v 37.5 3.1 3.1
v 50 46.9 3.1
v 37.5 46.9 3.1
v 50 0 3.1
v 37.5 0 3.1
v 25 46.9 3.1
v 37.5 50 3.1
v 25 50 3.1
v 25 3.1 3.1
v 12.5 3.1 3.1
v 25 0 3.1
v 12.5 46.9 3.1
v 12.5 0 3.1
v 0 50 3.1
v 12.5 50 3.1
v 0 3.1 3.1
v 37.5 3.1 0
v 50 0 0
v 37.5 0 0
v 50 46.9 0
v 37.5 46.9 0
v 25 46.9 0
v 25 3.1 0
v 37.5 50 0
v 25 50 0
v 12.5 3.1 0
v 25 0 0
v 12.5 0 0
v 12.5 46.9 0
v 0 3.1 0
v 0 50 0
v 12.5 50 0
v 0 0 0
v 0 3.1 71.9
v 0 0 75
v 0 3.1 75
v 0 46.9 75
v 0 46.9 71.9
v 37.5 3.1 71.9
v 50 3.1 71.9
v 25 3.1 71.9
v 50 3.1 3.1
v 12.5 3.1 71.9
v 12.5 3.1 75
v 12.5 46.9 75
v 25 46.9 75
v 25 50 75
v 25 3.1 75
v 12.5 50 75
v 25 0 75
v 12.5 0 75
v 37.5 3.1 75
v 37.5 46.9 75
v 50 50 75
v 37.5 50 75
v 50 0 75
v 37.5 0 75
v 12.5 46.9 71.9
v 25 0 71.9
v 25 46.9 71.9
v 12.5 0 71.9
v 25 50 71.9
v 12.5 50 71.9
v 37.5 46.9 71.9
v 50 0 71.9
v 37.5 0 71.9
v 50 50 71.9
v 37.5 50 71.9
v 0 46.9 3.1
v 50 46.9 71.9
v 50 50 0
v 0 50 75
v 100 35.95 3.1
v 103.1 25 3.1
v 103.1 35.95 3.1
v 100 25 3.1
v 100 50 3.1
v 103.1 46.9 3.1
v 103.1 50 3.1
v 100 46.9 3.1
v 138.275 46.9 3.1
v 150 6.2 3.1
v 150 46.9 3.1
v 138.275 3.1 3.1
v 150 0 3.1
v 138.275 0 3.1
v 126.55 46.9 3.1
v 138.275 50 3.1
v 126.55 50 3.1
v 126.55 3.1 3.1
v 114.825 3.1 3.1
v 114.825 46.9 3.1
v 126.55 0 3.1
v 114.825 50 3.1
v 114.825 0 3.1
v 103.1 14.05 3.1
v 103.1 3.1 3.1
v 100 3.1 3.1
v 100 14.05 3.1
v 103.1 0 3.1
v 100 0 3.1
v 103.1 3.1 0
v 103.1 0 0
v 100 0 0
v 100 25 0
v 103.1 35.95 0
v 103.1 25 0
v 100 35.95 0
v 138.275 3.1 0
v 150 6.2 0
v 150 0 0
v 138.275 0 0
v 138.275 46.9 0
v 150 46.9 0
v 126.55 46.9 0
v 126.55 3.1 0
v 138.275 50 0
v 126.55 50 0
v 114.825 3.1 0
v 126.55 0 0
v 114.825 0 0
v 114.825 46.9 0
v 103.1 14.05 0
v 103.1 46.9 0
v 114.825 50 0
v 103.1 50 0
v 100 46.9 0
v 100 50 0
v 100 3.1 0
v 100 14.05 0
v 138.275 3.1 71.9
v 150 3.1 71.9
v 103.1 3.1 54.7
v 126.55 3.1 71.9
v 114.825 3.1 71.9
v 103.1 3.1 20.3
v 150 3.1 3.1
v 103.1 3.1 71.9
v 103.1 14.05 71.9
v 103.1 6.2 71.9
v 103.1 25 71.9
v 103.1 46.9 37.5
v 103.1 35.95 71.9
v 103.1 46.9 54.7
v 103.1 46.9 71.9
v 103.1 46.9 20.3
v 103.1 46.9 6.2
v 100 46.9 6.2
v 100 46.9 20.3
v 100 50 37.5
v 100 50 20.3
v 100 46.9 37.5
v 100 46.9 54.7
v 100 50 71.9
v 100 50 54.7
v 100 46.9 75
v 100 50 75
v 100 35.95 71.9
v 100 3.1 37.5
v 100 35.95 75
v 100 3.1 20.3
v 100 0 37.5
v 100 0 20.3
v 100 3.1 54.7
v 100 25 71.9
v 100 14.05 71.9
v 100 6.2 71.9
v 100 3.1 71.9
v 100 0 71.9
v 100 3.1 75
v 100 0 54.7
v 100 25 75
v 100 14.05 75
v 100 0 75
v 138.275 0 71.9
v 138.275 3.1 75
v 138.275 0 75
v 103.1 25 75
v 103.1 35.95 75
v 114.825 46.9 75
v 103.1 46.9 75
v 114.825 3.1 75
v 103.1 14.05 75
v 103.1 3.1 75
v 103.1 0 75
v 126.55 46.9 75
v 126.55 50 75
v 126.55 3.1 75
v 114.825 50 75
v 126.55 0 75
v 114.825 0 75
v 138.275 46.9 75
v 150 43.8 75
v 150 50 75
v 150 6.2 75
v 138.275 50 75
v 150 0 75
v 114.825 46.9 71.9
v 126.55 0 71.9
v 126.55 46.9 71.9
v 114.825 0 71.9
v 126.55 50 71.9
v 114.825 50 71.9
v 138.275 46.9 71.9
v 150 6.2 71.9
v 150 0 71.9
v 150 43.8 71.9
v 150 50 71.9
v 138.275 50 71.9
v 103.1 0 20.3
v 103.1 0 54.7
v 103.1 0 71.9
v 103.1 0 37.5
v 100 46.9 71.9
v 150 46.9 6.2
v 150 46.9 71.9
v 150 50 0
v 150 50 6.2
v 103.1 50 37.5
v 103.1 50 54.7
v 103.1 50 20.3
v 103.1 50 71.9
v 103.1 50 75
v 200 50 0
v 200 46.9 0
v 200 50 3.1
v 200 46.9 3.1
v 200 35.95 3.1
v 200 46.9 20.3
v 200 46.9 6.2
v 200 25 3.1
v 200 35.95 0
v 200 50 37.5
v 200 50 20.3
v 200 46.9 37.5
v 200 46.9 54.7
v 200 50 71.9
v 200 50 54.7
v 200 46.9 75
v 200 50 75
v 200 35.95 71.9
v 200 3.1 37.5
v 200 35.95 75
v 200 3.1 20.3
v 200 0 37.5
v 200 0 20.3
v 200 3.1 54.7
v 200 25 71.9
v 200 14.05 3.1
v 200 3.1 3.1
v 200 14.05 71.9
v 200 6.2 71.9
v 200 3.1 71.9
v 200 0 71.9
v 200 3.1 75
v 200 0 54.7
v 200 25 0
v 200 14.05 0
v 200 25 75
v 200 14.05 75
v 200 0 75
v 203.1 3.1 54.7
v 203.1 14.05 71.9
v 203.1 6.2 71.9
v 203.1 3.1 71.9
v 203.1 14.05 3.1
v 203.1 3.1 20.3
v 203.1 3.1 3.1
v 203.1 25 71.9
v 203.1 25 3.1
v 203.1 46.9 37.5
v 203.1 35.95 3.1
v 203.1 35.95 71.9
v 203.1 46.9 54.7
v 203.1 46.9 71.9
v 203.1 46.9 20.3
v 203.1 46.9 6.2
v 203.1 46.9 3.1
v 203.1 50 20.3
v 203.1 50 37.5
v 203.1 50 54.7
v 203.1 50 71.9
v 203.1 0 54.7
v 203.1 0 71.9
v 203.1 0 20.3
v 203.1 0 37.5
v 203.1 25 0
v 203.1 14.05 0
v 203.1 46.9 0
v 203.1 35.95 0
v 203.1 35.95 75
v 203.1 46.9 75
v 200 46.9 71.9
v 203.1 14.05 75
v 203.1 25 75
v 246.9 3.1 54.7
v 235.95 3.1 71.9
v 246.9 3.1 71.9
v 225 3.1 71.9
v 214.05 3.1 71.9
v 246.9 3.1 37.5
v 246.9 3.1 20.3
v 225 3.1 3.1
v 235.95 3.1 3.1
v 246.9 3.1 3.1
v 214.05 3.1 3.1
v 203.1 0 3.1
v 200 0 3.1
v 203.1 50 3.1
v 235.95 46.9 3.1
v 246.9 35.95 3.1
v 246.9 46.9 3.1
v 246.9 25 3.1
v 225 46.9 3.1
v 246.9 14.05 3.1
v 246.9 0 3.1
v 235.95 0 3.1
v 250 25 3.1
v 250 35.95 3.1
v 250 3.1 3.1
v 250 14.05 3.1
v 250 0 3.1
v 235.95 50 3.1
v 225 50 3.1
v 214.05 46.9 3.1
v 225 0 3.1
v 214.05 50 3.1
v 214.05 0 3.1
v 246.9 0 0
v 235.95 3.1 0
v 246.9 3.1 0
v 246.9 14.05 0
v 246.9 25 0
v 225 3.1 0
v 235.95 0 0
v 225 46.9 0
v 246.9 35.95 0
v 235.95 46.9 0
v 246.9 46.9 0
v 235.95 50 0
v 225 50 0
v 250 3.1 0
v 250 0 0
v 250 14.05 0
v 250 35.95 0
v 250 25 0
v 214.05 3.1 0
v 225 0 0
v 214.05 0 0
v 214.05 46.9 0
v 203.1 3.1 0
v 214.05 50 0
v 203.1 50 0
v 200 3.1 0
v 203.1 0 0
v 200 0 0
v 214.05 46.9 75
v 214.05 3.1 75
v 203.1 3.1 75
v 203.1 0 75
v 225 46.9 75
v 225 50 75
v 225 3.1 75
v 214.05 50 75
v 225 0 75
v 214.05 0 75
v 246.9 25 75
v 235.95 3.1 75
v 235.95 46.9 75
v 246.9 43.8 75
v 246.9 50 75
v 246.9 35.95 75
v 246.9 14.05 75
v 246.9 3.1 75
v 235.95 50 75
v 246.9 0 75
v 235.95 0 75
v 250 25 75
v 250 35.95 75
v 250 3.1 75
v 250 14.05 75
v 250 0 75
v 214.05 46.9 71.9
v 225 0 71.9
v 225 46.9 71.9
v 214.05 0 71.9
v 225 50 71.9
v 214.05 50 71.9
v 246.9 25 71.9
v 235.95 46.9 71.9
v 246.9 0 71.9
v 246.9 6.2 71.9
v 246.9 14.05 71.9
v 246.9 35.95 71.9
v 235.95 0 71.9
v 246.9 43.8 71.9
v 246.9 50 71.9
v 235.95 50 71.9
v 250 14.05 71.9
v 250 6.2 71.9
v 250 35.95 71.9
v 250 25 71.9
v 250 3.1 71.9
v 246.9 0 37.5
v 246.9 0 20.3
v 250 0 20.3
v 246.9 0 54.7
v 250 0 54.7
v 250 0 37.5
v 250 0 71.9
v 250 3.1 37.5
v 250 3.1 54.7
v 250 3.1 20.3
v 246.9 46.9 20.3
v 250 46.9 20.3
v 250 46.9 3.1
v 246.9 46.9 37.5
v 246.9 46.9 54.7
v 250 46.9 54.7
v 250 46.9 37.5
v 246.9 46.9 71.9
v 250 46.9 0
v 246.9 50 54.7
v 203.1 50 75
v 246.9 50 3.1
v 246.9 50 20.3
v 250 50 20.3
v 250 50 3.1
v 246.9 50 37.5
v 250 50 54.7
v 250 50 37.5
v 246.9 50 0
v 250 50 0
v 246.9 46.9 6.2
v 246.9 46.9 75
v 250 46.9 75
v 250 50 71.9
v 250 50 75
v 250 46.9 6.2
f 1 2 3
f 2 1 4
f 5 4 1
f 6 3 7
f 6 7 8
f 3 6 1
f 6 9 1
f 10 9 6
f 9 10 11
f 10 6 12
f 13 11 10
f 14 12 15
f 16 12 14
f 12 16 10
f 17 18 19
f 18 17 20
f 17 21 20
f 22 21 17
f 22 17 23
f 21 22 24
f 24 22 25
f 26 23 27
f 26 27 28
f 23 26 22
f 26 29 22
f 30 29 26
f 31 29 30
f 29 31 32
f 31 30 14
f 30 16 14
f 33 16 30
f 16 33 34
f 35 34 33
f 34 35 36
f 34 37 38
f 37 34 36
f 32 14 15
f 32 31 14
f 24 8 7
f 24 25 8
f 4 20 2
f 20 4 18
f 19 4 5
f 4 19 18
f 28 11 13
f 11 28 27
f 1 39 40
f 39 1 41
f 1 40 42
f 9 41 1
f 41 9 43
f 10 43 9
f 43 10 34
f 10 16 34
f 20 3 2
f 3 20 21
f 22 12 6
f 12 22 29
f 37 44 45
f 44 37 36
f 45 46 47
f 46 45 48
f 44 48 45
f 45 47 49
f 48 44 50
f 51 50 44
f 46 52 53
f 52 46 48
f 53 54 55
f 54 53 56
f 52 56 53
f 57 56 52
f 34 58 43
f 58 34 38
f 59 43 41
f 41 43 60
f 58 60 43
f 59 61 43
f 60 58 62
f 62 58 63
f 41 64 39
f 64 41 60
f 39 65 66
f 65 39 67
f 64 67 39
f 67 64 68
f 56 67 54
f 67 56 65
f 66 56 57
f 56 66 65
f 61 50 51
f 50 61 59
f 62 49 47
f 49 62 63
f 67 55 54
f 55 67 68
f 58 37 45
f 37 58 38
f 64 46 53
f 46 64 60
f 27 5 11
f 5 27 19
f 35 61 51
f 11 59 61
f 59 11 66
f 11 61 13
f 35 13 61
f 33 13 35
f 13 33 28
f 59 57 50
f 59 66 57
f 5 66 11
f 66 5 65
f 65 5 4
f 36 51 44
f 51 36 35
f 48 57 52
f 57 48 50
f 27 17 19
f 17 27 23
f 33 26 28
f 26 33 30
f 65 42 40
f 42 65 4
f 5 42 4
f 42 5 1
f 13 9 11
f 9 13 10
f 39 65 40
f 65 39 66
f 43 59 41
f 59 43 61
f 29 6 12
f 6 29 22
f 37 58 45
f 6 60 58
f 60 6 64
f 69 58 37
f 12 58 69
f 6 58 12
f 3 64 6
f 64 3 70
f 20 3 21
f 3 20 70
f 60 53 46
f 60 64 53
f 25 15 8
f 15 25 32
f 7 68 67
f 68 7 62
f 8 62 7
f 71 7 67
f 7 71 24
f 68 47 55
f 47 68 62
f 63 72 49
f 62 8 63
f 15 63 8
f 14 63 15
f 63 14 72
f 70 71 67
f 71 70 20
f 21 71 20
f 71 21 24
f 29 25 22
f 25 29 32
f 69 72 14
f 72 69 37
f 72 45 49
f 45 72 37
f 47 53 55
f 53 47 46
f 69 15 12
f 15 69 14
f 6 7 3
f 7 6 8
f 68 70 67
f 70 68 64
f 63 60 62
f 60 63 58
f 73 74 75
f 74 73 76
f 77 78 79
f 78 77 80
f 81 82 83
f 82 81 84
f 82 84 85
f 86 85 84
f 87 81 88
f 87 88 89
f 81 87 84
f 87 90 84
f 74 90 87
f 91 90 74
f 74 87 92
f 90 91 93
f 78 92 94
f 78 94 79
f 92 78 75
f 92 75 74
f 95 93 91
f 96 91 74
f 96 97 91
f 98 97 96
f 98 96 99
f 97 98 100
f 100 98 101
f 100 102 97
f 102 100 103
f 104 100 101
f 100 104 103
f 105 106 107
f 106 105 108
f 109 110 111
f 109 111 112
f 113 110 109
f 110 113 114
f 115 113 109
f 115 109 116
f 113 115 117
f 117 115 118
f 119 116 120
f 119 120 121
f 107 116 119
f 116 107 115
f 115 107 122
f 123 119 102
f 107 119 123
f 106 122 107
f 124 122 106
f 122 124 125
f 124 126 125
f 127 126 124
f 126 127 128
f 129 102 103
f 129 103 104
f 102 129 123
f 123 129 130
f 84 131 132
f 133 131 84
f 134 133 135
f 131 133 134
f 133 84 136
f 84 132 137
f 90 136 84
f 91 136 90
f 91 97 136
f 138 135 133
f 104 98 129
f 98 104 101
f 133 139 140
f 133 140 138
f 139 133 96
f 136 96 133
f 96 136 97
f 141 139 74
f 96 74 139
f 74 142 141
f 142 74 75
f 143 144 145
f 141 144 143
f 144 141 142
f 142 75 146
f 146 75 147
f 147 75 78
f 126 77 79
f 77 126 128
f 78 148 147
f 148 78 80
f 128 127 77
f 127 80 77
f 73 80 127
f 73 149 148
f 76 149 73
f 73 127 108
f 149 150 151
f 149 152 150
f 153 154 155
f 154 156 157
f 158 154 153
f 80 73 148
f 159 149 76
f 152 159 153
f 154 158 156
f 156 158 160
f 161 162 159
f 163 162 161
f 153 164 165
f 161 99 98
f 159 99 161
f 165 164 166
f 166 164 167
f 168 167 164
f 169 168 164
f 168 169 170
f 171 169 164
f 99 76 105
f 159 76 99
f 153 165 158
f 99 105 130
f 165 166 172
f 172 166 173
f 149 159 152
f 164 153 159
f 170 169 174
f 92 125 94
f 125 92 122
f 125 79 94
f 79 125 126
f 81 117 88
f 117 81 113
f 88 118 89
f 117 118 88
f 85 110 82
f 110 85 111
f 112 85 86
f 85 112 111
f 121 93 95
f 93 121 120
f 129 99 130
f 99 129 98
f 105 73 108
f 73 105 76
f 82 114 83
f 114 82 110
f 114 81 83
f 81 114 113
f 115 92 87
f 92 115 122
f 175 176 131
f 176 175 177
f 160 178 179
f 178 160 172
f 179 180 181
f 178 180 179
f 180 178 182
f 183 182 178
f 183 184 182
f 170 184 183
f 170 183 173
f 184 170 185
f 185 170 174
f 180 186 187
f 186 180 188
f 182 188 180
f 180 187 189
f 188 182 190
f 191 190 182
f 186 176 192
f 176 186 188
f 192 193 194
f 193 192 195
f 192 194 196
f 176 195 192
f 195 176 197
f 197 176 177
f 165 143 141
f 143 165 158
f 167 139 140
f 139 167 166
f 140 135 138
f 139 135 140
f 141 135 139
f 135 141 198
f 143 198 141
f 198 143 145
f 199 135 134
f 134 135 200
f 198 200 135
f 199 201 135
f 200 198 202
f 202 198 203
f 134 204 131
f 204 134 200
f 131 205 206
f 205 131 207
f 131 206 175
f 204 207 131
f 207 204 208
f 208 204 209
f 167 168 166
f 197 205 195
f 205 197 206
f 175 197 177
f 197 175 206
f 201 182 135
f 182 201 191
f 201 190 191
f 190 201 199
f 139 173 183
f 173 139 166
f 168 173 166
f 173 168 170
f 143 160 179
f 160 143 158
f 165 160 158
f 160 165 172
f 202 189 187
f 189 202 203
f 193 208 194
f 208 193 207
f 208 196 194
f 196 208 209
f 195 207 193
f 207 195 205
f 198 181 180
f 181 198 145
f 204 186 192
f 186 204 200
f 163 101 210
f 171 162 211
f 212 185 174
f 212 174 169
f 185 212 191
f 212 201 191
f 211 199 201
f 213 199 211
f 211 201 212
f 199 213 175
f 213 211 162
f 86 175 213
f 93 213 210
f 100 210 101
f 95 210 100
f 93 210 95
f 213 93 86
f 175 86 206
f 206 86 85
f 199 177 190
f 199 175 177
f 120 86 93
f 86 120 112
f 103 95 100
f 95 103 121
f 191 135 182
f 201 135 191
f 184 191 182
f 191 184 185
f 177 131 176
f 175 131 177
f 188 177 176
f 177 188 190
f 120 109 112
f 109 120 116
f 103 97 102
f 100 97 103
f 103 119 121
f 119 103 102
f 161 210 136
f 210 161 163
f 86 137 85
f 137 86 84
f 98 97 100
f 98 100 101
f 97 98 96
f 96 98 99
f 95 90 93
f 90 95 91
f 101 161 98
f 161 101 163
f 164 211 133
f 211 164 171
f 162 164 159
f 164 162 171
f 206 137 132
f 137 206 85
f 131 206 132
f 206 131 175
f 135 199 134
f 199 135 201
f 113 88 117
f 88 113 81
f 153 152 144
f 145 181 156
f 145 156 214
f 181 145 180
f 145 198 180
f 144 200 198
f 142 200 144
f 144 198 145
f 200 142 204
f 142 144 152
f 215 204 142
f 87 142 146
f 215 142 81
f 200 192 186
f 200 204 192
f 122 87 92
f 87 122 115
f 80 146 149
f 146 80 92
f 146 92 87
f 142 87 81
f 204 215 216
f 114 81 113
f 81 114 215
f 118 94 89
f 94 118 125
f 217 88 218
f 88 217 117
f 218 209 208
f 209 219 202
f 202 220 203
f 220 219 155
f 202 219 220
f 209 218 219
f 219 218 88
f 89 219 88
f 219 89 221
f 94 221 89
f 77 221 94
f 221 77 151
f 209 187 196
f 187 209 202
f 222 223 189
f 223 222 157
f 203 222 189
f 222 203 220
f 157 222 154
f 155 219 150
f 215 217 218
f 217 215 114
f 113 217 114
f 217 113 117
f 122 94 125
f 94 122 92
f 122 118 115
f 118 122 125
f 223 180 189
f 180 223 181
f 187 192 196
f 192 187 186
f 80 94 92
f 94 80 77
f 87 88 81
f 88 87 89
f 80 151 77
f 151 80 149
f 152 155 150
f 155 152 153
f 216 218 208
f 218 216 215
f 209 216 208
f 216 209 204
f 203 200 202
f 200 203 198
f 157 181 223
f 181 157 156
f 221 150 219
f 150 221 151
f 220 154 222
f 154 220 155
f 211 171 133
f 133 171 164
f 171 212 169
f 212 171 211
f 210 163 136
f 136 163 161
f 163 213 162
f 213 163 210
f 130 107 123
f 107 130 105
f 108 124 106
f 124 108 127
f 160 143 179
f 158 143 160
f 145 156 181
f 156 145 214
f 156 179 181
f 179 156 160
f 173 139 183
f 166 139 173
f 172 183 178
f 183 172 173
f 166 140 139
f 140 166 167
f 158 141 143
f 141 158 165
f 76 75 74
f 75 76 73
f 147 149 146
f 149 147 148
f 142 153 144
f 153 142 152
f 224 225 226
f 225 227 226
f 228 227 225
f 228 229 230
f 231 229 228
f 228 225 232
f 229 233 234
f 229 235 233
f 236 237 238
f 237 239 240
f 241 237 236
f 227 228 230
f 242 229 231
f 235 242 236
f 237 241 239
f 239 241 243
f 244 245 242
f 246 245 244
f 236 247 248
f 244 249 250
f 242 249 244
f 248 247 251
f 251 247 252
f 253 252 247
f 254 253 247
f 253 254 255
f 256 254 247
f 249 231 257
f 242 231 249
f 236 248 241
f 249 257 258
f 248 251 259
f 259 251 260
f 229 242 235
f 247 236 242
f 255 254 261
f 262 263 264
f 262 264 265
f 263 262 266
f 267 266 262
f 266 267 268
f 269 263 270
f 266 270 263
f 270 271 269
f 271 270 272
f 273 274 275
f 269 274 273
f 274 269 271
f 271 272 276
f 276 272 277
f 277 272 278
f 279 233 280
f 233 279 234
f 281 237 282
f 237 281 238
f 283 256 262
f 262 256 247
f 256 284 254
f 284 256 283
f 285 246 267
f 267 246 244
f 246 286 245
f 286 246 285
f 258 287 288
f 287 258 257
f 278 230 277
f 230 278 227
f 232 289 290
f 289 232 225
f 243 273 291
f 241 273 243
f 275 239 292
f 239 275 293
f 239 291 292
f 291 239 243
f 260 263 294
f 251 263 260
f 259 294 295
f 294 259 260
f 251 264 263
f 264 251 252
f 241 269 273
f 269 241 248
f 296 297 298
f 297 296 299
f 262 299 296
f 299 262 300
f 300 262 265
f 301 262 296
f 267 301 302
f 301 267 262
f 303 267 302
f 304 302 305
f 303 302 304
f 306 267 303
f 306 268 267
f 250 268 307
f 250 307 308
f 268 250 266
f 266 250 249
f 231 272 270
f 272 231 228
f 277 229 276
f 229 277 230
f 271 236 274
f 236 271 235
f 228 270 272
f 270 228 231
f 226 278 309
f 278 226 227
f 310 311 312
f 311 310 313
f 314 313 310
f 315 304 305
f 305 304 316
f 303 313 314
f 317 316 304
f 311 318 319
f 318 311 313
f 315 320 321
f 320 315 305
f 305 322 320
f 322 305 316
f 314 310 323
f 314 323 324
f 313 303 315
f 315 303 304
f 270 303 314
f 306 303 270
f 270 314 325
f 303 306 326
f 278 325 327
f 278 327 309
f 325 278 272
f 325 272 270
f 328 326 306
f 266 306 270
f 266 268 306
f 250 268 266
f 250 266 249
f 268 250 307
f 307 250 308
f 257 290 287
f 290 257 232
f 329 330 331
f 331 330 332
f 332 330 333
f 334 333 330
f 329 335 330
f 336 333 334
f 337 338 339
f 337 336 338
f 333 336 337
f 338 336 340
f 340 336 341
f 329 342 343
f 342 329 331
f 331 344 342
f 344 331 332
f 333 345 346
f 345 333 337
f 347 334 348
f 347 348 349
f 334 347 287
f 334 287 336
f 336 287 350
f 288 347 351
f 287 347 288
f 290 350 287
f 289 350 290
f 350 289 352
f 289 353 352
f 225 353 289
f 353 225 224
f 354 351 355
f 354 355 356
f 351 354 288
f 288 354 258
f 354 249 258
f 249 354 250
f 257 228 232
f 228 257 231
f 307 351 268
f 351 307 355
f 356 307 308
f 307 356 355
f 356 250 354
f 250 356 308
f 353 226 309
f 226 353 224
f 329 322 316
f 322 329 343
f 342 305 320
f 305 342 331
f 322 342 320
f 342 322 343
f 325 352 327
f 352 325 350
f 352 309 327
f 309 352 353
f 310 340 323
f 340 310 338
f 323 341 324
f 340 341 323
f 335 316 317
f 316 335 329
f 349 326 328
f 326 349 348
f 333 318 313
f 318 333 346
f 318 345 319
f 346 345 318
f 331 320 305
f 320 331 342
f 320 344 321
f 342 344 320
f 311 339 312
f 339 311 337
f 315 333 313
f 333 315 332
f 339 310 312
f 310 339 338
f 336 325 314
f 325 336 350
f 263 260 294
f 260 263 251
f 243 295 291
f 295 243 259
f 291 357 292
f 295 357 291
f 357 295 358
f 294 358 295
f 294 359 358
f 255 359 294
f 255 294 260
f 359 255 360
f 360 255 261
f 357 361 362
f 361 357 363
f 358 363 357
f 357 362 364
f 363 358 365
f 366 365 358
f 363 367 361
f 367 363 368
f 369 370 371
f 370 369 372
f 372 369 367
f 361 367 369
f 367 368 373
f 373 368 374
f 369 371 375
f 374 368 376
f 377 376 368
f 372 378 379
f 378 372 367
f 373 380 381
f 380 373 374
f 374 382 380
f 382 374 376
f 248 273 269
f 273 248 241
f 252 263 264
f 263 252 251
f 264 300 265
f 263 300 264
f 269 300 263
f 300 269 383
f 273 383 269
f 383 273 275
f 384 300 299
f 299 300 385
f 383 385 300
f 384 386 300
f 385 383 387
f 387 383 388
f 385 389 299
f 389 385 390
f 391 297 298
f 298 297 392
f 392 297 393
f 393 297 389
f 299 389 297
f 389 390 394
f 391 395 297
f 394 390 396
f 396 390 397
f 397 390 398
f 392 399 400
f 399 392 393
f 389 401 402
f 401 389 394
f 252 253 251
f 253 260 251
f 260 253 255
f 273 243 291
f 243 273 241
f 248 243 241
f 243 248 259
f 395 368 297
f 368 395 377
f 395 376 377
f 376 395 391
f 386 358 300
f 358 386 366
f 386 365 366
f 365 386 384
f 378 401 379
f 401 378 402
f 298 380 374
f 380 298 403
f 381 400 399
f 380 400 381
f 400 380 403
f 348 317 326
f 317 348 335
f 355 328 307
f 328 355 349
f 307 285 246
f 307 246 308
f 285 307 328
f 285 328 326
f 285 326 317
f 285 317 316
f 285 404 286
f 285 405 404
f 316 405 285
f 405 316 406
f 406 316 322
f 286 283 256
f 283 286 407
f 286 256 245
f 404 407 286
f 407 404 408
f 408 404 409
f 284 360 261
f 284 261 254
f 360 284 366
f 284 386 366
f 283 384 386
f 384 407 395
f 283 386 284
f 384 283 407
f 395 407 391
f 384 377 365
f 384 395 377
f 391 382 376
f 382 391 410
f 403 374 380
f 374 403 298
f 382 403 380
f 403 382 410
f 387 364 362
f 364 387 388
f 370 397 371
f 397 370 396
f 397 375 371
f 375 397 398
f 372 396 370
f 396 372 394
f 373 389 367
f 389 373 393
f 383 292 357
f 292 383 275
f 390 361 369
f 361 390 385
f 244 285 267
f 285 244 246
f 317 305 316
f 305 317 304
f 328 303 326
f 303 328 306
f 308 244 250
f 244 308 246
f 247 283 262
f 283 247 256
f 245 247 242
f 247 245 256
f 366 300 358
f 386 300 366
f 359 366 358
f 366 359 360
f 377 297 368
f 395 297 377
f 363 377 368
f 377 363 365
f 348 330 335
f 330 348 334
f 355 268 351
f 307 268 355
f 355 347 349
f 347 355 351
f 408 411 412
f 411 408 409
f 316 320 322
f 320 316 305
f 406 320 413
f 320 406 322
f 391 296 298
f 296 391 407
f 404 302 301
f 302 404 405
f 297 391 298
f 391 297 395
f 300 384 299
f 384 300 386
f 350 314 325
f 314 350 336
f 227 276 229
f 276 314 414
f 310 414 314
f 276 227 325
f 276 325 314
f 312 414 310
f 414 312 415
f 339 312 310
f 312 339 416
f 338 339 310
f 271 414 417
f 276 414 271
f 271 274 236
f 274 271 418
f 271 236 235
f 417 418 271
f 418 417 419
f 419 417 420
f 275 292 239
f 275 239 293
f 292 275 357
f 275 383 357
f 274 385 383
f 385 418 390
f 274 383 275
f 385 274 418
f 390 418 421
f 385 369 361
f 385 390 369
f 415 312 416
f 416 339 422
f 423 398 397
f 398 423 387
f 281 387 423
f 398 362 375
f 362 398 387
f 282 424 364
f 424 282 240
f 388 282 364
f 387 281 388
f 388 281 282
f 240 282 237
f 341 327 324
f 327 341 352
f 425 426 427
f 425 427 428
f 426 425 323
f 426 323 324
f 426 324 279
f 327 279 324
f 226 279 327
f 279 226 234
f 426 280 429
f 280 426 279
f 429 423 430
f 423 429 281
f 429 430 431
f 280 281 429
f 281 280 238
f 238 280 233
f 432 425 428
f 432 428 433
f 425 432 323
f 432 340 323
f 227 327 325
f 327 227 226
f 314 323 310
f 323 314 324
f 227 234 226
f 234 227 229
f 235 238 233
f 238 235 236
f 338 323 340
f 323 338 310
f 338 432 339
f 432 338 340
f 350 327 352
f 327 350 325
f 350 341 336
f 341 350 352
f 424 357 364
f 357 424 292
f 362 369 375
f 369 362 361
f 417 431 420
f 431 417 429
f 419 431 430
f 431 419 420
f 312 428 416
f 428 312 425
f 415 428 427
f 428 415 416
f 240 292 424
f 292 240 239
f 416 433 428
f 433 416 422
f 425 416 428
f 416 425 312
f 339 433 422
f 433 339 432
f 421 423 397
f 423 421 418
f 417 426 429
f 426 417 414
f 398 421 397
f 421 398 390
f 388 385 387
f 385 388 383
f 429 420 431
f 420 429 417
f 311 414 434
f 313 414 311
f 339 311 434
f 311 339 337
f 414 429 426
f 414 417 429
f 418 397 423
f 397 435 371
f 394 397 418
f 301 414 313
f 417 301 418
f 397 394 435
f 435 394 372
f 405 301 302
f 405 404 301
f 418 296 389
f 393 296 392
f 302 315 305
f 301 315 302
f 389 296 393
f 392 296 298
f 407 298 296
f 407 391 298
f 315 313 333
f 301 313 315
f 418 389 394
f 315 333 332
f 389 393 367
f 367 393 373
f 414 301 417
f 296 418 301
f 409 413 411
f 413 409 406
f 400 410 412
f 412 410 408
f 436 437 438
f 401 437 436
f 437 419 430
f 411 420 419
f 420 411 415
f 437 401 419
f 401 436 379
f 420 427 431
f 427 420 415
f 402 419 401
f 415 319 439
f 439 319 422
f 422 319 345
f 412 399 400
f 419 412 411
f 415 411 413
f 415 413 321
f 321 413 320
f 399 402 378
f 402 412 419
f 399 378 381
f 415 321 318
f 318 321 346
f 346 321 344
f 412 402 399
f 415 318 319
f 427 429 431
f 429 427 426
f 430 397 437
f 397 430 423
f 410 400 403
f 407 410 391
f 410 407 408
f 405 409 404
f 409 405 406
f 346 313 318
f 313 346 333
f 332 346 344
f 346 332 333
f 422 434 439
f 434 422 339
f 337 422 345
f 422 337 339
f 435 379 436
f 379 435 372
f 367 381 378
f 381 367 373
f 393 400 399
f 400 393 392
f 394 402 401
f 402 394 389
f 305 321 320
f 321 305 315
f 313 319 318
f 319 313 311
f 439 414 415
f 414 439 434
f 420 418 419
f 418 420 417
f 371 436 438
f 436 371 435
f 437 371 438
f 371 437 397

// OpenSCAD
include <../lasercut.scad>; 

thickness = 3.1;
x = 50;
y = 50;
z = 75; 


for (sides =[1:6])
{
    color("Gold",0.75) translate([100*(sides-4),0,0]) 
        lasercutoutBox(thickness = thickness, x=x, y=y, z=z, sides=sides);
}
